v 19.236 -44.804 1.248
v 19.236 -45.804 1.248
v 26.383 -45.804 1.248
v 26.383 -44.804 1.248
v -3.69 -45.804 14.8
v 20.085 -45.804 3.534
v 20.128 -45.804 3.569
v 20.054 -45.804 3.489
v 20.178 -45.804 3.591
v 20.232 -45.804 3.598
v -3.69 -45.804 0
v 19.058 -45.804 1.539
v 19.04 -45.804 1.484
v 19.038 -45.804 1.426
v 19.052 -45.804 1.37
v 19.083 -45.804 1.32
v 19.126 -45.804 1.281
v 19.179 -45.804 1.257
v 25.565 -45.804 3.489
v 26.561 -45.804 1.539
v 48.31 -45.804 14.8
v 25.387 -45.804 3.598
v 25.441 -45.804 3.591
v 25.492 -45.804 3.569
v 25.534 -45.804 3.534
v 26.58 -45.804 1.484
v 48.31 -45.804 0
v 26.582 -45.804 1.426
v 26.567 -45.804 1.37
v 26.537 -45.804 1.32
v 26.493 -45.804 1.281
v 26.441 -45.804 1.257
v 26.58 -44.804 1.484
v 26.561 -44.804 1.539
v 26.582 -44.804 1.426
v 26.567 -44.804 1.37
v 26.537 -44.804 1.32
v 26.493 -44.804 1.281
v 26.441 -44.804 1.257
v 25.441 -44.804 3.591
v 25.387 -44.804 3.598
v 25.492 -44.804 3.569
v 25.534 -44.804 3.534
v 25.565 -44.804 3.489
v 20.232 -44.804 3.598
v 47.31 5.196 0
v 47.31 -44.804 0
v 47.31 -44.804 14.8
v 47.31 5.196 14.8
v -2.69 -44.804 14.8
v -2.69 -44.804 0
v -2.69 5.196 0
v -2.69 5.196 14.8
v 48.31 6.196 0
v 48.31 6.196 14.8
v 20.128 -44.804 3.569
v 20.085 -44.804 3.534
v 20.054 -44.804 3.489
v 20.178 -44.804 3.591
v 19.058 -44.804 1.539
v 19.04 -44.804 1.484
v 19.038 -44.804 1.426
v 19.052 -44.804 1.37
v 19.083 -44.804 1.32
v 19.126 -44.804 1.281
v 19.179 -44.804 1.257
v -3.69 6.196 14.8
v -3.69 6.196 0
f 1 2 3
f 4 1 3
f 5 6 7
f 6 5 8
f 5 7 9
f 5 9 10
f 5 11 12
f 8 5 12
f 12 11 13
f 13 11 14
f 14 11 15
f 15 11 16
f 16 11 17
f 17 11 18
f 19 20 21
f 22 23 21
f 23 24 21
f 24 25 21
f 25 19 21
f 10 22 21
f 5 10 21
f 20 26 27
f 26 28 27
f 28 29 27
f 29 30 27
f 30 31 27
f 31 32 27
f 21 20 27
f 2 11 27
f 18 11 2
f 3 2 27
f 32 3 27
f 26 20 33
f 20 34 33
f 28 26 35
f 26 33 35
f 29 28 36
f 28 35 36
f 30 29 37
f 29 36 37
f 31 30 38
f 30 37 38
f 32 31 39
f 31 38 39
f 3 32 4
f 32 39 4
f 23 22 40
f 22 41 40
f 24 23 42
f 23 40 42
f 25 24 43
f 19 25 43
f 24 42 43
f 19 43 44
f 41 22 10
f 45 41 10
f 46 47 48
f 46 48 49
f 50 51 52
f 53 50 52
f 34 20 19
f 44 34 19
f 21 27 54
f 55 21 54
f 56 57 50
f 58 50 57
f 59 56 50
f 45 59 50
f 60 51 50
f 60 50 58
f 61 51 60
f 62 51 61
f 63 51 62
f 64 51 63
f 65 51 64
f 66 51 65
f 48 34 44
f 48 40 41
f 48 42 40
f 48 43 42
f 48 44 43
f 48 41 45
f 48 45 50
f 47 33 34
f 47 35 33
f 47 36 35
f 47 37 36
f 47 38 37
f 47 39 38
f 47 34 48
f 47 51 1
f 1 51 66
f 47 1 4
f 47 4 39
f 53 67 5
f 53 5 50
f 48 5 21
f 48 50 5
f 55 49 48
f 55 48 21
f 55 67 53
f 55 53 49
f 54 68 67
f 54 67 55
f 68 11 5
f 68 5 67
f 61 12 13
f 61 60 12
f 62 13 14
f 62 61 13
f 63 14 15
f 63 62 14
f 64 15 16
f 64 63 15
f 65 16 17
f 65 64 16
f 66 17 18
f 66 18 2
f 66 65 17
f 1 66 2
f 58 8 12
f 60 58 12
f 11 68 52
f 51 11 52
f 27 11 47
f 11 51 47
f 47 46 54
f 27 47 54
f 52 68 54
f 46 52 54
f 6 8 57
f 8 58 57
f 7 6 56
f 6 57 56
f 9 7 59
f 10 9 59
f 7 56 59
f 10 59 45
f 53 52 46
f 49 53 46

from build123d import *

# Parameters (mm, degrees)
F0_W     = 52
F0_H     = 52
F0_W_2   = 50
F0_H_2   = 50
F4_DEPTH = 14.8
F2_DEPTH = 1
F3_R     = 0.2


with BuildPart() as f4:
    # F0 (on Top) → F4 (new body)
    with BuildSketch(Plane.XY):
        with Locations((22.309654, -19.803896)):
            Rectangle(F0_W, F0_H)
        with Locations((22.309654, -19.803896)):
            Rectangle(F0_W_2, F0_H_2, mode=Mode.SUBTRACT)
    extrude(amount=F4_DEPTH)

    # F1 (on face) → F2 (cut, through all)
    with BuildSketch(Plane.XZ.offset(45.803896)):
        Polygon((18.909654, 1.248189), (22.309654, 1.248189), (26.709654, 1.248189), (25.509654, 3.598189), (22.809654, 3.598189), (20.109654, 3.598189), align=None)
    extrude(amount=-F2_DEPTH, mode=Mode.SUBTRACT)

    # F3
    f3_edges = [f4.edges().sort_by_distance(p)[0] for p in [
        (18.909654, -45.303896, 1.248189),
        (26.709654, -45.303896, 1.248189),
        (25.509654, -45.303896, 3.598189),
        (20.109654, -45.303896, 3.598189),
    ]]
    fillet(f3_edges, radius=F3_R)


solid = f4.part
